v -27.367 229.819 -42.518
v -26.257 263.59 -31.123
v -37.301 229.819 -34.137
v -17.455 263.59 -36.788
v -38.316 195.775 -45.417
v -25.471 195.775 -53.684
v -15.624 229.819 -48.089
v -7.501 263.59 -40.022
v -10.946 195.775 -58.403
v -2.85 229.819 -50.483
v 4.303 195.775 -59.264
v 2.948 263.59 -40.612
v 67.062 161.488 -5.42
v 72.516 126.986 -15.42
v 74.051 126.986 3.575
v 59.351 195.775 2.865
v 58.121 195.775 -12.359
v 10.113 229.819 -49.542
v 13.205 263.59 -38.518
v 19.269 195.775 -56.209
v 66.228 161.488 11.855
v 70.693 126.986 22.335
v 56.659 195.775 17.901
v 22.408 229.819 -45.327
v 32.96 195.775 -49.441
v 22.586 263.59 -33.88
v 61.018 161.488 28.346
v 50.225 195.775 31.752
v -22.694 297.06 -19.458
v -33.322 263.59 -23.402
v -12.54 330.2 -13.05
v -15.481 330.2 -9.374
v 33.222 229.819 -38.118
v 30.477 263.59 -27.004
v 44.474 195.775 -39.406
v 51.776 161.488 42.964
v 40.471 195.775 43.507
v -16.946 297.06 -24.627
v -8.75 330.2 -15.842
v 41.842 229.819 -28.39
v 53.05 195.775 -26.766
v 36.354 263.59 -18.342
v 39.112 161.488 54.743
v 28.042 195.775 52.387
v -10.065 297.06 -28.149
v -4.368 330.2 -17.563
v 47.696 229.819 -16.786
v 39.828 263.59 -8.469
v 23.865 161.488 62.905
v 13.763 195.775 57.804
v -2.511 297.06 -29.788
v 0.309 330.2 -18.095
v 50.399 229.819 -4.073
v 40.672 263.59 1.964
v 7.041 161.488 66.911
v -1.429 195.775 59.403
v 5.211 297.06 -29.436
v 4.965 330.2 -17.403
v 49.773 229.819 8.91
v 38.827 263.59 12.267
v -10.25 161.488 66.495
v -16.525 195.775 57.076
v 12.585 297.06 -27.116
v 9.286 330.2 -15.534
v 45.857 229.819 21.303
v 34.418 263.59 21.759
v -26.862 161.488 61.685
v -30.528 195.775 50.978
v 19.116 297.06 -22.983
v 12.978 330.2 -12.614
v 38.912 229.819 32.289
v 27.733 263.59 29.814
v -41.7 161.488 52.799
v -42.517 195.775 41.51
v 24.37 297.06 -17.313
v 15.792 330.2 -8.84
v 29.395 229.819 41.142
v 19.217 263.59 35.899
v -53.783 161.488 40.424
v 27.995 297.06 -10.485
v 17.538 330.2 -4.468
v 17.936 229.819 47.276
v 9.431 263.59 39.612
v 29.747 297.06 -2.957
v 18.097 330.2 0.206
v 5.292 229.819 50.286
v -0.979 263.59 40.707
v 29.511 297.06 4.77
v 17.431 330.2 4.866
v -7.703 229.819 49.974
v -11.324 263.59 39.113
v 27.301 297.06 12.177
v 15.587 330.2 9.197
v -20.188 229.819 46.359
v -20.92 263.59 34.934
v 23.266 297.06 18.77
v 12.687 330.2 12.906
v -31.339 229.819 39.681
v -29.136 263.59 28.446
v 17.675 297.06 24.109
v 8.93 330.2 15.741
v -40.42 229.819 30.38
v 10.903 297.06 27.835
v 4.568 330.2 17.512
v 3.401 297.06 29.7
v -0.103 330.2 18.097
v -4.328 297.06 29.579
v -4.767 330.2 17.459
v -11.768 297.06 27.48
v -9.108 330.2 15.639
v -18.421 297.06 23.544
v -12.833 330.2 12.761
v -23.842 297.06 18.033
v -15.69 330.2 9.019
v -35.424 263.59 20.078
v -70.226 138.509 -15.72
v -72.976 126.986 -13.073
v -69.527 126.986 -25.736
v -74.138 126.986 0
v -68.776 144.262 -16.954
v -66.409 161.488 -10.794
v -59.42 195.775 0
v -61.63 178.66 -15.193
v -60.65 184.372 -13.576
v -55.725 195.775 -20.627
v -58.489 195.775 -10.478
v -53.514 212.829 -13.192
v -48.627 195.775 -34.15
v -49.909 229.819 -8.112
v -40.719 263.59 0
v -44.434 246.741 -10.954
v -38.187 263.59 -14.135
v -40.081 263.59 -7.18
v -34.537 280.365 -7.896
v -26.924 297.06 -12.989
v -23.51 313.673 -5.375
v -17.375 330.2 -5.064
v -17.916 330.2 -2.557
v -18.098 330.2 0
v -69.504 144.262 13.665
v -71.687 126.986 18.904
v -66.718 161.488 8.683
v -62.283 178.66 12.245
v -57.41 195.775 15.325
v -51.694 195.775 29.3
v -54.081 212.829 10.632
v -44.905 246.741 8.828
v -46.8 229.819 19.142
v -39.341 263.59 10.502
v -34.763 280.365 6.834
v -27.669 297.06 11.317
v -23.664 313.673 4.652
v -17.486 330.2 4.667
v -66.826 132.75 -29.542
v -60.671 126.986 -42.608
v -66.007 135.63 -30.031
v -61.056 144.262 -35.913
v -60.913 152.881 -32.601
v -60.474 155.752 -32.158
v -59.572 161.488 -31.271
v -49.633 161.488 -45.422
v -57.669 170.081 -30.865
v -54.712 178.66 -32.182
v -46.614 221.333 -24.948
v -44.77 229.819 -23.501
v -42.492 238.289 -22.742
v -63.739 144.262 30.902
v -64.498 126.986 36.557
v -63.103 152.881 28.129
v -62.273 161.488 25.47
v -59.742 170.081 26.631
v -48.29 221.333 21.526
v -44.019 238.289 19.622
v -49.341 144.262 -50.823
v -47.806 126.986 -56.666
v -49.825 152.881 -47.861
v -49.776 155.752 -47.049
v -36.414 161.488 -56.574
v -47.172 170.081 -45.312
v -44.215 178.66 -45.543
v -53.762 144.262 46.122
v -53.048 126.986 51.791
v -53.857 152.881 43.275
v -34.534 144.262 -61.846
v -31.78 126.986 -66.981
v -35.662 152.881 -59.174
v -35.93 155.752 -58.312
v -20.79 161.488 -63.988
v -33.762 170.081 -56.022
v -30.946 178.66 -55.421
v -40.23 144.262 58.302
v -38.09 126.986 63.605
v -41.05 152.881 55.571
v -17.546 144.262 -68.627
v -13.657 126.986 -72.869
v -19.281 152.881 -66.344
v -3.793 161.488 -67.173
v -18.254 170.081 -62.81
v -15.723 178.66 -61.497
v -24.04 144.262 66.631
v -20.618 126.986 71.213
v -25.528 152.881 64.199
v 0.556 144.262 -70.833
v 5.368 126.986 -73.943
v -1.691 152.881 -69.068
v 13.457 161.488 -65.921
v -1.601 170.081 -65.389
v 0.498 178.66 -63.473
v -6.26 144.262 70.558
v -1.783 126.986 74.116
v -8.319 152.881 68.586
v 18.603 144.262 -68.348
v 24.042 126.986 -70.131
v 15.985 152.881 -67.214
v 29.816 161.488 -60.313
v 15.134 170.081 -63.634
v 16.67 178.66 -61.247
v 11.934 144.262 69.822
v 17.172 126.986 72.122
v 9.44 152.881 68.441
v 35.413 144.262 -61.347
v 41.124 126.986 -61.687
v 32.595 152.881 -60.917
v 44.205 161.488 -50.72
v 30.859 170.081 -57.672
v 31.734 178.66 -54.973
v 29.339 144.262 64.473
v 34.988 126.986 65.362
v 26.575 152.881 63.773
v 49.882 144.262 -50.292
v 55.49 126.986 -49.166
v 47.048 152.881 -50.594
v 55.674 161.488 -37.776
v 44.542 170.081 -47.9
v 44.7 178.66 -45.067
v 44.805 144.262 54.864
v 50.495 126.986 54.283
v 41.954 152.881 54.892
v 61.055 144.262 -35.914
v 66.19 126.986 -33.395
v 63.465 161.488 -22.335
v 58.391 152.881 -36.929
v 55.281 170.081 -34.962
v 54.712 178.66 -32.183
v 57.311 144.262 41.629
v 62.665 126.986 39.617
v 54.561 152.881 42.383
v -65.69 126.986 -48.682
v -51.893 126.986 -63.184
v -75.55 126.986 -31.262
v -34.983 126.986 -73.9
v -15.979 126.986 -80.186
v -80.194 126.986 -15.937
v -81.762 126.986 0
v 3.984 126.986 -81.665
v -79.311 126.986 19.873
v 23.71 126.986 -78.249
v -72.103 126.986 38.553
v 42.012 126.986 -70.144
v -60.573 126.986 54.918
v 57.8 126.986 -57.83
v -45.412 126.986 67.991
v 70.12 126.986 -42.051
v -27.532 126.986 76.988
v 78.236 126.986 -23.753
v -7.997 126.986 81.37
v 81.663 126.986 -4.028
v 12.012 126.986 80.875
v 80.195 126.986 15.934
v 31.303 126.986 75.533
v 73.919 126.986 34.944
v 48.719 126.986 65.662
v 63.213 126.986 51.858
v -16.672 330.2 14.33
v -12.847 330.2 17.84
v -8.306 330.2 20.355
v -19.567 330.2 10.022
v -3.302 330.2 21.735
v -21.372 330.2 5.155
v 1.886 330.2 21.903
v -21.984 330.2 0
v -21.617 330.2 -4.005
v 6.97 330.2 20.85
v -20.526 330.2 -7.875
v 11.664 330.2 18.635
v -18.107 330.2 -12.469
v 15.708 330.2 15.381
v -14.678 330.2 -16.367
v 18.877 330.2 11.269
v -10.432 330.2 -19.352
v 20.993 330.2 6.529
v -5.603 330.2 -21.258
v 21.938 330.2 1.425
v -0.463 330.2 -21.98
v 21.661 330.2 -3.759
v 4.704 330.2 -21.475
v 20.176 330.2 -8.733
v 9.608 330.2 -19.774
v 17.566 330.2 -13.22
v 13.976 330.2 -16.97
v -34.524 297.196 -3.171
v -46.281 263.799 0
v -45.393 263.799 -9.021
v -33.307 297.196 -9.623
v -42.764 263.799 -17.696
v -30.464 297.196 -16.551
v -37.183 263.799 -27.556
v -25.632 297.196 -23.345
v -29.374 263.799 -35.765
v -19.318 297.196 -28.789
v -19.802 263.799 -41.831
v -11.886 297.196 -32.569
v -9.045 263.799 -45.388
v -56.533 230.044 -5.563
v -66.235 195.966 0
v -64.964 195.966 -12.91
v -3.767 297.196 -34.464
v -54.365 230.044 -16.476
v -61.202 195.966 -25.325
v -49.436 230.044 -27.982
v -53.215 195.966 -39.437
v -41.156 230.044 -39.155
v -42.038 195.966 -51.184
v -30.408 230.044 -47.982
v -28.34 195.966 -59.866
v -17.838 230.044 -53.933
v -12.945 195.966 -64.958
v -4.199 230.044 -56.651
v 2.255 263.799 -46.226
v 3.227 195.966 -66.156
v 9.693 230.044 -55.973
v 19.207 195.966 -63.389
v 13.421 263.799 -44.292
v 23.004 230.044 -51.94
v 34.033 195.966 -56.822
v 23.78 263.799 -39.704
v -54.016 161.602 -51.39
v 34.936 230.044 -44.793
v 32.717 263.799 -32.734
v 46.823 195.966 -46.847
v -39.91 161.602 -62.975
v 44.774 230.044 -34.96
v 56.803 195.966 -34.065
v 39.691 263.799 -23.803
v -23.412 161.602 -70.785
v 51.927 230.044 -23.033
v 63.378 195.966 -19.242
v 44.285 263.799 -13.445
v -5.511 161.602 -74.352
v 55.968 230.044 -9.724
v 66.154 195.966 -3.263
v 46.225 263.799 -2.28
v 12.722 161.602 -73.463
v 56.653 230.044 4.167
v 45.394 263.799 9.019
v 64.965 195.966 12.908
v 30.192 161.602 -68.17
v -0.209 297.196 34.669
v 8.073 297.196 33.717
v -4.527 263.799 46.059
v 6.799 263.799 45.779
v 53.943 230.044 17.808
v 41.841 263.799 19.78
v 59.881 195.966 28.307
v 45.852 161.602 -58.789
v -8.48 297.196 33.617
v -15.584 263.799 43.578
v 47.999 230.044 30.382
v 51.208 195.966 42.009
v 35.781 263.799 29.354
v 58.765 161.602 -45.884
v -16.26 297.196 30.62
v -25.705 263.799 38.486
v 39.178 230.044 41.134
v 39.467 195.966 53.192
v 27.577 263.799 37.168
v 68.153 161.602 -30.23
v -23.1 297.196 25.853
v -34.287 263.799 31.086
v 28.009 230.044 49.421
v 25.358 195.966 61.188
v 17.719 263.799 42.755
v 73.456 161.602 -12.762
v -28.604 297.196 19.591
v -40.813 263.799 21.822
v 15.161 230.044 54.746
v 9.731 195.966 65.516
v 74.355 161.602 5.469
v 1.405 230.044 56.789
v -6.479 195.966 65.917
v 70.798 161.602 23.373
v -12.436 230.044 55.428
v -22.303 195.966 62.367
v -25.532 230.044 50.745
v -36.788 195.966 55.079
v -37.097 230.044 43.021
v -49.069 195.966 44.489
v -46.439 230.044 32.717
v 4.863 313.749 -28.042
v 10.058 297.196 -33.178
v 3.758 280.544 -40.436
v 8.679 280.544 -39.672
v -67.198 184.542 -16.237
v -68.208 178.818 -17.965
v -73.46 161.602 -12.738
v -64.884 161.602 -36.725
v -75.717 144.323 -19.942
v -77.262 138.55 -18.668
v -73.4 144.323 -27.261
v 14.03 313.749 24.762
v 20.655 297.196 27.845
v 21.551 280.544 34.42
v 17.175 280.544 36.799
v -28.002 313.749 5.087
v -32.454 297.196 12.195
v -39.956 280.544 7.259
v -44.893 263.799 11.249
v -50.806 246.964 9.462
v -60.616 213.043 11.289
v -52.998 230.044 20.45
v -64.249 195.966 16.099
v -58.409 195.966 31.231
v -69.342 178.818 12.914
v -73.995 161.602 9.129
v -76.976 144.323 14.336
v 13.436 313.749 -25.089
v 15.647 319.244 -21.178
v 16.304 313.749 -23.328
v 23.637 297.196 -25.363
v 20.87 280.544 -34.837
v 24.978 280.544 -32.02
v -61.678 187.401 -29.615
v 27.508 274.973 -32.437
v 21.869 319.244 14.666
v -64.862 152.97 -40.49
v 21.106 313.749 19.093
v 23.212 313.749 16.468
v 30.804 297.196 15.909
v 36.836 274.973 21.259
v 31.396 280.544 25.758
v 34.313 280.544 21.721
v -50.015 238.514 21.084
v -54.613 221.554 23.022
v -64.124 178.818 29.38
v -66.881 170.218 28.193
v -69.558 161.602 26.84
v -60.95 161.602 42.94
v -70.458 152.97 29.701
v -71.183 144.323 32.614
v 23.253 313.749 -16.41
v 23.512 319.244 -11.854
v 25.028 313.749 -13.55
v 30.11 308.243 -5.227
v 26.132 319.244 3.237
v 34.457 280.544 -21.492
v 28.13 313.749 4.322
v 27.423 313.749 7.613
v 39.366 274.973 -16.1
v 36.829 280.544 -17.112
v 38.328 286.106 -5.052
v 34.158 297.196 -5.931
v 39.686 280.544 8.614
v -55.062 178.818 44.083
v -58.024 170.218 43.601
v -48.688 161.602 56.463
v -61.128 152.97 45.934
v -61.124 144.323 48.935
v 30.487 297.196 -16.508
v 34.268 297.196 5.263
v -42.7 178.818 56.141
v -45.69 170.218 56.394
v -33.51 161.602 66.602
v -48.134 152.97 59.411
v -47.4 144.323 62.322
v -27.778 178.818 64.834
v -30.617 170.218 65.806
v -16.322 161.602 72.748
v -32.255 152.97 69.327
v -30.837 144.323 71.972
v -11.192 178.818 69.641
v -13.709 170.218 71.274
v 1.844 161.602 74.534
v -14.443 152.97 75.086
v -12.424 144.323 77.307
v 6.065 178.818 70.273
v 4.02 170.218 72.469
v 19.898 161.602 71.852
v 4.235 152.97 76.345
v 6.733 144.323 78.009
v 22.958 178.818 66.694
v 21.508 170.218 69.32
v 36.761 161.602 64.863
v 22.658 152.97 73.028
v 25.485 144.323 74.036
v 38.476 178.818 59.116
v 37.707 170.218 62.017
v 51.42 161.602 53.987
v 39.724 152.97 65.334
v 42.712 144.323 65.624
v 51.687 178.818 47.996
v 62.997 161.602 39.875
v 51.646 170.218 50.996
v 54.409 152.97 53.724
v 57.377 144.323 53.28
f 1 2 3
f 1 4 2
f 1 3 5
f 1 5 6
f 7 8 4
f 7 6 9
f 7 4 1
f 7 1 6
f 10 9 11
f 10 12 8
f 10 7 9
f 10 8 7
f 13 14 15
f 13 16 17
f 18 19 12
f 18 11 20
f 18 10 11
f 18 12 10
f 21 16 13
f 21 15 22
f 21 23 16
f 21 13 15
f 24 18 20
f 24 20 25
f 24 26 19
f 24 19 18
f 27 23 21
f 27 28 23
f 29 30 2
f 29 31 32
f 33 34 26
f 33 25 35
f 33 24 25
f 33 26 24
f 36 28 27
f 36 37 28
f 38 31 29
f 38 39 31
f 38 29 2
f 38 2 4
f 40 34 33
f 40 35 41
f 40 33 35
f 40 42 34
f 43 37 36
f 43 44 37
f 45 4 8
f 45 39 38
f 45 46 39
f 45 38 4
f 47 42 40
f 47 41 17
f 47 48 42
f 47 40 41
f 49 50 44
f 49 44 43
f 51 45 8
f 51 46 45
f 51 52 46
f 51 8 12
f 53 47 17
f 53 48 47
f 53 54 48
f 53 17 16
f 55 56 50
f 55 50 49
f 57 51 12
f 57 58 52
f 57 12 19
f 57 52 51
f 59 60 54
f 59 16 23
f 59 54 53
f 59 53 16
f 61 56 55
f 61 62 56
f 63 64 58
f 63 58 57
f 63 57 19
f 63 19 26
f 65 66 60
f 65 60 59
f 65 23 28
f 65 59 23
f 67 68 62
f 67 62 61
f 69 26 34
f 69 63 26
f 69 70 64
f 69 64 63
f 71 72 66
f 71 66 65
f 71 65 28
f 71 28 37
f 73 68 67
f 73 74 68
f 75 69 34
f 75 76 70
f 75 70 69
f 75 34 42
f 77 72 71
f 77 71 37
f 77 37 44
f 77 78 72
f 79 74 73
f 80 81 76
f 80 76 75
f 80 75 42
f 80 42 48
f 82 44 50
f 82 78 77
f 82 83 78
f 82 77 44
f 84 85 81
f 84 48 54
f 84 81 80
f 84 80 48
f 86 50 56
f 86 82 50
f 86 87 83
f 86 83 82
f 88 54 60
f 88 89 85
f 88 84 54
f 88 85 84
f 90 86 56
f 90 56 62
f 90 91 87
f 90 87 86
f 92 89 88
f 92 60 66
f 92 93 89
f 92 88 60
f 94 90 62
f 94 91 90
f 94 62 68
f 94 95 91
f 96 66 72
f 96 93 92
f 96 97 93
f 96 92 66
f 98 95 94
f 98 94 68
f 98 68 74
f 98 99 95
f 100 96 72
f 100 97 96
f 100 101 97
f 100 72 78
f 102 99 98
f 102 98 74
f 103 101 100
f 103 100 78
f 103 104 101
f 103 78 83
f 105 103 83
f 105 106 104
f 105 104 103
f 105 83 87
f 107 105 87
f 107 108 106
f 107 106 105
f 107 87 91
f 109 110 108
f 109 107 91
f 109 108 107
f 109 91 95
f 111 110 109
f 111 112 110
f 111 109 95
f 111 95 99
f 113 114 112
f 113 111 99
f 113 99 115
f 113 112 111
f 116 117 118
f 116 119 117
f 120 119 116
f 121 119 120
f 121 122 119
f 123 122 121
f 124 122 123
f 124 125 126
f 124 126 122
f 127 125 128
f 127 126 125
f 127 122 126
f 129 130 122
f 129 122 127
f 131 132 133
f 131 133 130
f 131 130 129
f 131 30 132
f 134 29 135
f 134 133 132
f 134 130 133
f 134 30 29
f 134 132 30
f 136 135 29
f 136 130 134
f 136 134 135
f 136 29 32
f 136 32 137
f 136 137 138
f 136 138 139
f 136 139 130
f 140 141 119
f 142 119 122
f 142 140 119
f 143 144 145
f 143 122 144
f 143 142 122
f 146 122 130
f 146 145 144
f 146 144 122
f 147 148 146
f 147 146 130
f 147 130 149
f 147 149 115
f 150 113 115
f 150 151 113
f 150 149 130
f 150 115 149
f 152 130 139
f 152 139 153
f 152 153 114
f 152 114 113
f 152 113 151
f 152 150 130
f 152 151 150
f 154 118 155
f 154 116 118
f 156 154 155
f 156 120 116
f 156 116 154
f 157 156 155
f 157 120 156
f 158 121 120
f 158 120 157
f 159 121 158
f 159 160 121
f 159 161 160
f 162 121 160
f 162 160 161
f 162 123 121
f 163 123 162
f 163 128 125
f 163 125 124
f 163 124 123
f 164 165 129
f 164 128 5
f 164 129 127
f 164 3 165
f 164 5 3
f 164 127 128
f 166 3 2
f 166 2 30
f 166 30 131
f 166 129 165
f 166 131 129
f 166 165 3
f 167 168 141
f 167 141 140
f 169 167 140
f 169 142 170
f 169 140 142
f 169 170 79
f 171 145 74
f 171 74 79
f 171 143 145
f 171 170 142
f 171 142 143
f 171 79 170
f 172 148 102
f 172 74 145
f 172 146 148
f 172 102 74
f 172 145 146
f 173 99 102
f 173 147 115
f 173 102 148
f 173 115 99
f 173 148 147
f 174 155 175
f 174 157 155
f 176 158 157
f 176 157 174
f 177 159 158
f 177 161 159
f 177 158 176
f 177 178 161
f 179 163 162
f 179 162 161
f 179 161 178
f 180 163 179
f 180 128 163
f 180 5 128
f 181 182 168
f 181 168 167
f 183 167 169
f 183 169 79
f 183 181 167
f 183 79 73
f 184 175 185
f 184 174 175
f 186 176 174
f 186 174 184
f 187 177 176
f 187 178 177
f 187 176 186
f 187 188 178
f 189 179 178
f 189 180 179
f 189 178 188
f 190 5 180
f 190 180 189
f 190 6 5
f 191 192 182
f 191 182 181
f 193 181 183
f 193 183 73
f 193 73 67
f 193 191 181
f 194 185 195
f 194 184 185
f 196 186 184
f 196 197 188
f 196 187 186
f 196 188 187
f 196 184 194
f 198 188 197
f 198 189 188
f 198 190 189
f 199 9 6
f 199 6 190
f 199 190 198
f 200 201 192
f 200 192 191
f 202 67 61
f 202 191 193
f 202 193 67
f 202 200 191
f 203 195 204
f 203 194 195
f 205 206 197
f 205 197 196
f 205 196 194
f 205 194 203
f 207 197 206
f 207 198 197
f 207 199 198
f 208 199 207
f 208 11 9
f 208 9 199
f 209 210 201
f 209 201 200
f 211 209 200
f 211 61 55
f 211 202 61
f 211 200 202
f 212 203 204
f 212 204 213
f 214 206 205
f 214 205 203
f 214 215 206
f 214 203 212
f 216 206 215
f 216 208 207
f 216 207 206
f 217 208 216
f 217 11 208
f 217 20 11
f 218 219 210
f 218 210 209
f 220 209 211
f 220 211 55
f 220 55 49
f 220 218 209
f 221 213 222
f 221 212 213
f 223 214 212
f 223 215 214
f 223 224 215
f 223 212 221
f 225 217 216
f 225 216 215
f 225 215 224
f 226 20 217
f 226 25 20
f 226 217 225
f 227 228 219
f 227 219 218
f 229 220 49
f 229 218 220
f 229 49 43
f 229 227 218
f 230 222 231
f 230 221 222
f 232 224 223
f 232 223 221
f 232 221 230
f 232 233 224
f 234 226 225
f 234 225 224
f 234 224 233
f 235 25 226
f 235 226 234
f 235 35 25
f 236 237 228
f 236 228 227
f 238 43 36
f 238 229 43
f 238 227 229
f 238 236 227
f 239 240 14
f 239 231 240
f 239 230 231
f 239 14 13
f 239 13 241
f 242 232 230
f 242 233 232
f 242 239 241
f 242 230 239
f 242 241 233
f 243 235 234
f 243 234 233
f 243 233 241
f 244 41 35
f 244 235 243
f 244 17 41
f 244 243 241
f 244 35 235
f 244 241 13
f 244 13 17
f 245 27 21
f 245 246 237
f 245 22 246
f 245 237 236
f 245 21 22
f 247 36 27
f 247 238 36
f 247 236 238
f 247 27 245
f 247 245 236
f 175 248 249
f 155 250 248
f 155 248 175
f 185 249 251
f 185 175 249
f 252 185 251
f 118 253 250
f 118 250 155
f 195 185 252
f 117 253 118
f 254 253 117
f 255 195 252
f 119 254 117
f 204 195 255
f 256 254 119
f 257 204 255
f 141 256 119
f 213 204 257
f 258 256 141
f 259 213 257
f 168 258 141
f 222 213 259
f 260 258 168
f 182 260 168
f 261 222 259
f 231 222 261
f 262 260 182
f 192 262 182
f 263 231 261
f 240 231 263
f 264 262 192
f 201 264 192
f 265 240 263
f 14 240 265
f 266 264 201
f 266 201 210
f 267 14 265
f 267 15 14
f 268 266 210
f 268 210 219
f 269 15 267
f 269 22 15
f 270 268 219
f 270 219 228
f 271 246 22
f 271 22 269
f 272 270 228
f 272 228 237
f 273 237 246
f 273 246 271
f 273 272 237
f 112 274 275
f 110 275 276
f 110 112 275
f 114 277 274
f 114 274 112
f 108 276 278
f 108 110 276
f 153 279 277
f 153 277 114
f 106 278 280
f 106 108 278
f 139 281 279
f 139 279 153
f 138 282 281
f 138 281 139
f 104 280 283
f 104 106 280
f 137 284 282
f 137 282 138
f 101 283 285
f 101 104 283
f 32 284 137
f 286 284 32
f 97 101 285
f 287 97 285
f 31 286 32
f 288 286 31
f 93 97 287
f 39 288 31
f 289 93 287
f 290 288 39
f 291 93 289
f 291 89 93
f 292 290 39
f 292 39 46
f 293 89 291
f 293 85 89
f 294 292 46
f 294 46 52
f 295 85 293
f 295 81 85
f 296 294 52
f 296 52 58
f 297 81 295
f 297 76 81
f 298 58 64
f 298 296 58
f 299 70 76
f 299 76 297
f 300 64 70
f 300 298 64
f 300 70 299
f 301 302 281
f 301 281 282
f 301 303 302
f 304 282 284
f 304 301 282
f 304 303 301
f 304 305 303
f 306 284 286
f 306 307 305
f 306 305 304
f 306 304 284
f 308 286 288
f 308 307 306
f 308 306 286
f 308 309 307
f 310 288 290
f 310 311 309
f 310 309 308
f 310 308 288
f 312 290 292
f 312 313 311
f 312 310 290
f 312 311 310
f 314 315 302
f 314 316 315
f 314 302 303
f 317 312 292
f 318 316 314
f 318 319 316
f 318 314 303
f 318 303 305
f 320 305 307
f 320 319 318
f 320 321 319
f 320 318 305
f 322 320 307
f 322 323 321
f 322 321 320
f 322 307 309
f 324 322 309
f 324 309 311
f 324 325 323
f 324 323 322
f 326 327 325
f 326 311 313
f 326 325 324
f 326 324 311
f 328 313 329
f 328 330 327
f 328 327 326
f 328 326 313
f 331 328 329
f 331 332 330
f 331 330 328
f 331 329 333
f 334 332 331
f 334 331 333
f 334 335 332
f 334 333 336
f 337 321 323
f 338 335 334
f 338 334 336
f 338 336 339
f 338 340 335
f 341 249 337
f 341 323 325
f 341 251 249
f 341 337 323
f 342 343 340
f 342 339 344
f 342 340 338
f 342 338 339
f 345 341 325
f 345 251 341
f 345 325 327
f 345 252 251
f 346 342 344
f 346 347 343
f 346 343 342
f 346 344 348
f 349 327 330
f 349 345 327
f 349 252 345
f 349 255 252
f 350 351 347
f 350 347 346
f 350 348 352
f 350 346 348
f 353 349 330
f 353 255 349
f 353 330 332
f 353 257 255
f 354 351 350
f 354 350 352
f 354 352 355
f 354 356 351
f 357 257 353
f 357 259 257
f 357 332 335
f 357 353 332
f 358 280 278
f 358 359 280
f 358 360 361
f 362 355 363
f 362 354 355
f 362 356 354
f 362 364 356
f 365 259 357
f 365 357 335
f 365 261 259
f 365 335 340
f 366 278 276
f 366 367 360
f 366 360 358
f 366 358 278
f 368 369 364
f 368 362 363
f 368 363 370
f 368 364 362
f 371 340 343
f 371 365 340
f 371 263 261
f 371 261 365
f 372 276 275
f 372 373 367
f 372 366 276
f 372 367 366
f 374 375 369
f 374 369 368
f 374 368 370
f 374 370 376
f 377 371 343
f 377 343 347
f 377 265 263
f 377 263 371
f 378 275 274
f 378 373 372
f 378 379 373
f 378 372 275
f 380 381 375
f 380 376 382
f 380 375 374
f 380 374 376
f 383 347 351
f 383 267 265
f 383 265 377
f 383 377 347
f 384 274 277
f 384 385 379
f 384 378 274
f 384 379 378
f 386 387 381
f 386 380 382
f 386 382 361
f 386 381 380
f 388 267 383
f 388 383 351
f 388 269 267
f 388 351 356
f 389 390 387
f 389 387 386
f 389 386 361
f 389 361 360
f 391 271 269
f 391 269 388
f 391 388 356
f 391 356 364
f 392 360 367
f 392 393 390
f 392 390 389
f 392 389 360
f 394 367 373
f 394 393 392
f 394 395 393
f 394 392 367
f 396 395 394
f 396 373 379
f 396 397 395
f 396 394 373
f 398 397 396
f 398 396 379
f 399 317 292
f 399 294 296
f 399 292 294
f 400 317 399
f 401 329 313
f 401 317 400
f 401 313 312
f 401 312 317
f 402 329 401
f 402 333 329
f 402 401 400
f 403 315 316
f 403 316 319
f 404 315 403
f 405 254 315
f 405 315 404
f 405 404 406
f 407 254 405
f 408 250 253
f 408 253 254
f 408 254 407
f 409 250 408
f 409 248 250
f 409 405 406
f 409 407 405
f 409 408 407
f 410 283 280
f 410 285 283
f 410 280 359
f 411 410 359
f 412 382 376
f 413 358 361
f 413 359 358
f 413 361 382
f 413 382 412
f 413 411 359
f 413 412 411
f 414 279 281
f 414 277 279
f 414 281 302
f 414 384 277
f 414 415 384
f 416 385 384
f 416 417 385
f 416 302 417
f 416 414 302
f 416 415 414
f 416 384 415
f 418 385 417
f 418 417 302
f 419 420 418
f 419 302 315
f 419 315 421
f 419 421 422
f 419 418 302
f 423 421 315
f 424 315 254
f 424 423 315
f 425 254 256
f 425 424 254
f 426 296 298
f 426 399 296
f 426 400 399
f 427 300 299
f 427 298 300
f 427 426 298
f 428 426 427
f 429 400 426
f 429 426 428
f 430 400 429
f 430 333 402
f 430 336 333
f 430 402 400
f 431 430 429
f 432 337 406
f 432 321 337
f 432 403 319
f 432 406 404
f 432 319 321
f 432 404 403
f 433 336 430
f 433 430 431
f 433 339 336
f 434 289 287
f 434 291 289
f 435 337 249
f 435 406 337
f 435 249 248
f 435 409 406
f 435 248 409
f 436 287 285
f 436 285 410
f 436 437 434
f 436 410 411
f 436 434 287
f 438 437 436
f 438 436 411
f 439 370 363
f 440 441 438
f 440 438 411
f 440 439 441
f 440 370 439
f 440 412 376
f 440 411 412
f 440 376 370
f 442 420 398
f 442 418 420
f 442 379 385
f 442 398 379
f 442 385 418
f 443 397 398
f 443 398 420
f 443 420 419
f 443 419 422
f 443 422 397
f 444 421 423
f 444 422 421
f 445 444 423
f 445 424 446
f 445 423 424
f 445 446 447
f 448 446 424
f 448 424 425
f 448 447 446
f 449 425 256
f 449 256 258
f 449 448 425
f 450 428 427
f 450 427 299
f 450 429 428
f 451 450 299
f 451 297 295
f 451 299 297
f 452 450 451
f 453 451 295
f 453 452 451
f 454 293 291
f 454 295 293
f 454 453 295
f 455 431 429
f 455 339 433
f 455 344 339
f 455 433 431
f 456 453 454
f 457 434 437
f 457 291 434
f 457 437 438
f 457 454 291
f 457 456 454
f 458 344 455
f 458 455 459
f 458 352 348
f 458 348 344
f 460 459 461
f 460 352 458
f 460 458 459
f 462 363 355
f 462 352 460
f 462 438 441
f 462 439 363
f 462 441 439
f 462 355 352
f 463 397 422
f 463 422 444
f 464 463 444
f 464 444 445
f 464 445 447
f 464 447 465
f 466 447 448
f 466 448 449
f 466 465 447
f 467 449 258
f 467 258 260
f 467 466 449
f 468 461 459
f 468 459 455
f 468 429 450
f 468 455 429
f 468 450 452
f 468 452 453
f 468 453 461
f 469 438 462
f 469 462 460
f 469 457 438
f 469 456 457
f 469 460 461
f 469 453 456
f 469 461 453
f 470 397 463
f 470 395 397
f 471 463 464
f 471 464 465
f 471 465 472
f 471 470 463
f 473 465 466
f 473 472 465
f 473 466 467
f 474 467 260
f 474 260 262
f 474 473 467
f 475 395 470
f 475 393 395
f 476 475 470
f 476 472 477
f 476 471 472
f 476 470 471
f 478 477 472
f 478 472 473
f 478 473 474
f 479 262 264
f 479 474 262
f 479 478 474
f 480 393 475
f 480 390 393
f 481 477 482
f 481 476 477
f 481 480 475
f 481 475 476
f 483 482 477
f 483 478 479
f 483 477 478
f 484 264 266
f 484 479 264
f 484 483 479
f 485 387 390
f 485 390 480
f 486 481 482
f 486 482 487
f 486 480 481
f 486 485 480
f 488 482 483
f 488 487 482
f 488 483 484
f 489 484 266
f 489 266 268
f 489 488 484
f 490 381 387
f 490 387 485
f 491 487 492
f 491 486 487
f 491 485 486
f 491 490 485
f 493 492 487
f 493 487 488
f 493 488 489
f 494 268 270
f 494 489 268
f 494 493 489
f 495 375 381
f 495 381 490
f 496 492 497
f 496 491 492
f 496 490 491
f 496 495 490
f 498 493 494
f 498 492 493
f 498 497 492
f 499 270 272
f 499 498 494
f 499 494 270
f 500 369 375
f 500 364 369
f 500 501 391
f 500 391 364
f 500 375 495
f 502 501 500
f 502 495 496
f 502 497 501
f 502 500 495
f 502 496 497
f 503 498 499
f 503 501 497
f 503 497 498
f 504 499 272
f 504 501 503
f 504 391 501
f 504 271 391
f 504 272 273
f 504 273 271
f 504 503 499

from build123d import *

# Parameters (mm, degrees)
SKETCH4_R           = 93.1545
SKETCH4_R_2         = 90.4875
BOSS_EXTRUDE2_DEPTH = 40.3999954
SKETCH7_R           = 317.5
CUT_EXTRUDE2_DEPTH  = 50.8
SKETCH8_R           = 119.216810528
CUT_EXTRUDE3_DEPTH  = 167.386


with BuildPart() as part:
    # Sketch2 → Revolve1 (revolve)
    with BuildSketch(Plane.XY):
        with BuildLine():
            Line((-98.425, 0), (-90.551, 0))
            ThreePointArc((-90.551, 0), (-60.43106349, 191.610647557), (0, 375.92))
            Line((0, 375.92), (0, 381))
            ThreePointArc((0, 381), (-66.494117829, 194.964417939), (-98.425, 0))
        make_face()
    revolve(axis=Axis((0, 381, 0), (0, -1, 0)))

    # Sketch4 → Boss-Extrude2 (add)
    with BuildSketch(Plane(origin=(0, 0, 0), x_dir=(-1, 0, 0), z_dir=(0, -1, 0))):
        Circle(SKETCH4_R)
        Circle(SKETCH4_R_2, mode=Mode.SUBTRACT)
    extrude(amount=BOSS_EXTRUDE2_DEPTH)

    # Sketch7 → Cut-Extrude2 (cut)
    with BuildSketch(Plane(origin=(0, 381, 0), x_dir=(1, 0, 0), z_dir=(0, 1, 0))):
        Circle(SKETCH7_R)
    extrude(amount=-CUT_EXTRUDE2_DEPTH, mode=Mode.SUBTRACT)

    # Sketch8 → Cut-Extrude3 (cut)
    with BuildSketch(Plane.XZ.offset(40.3999954)):
        Circle(SKETCH8_R)
    extrude(amount=-CUT_EXTRUDE3_DEPTH, mode=Mode.SUBTRACT)


solid = part.part
